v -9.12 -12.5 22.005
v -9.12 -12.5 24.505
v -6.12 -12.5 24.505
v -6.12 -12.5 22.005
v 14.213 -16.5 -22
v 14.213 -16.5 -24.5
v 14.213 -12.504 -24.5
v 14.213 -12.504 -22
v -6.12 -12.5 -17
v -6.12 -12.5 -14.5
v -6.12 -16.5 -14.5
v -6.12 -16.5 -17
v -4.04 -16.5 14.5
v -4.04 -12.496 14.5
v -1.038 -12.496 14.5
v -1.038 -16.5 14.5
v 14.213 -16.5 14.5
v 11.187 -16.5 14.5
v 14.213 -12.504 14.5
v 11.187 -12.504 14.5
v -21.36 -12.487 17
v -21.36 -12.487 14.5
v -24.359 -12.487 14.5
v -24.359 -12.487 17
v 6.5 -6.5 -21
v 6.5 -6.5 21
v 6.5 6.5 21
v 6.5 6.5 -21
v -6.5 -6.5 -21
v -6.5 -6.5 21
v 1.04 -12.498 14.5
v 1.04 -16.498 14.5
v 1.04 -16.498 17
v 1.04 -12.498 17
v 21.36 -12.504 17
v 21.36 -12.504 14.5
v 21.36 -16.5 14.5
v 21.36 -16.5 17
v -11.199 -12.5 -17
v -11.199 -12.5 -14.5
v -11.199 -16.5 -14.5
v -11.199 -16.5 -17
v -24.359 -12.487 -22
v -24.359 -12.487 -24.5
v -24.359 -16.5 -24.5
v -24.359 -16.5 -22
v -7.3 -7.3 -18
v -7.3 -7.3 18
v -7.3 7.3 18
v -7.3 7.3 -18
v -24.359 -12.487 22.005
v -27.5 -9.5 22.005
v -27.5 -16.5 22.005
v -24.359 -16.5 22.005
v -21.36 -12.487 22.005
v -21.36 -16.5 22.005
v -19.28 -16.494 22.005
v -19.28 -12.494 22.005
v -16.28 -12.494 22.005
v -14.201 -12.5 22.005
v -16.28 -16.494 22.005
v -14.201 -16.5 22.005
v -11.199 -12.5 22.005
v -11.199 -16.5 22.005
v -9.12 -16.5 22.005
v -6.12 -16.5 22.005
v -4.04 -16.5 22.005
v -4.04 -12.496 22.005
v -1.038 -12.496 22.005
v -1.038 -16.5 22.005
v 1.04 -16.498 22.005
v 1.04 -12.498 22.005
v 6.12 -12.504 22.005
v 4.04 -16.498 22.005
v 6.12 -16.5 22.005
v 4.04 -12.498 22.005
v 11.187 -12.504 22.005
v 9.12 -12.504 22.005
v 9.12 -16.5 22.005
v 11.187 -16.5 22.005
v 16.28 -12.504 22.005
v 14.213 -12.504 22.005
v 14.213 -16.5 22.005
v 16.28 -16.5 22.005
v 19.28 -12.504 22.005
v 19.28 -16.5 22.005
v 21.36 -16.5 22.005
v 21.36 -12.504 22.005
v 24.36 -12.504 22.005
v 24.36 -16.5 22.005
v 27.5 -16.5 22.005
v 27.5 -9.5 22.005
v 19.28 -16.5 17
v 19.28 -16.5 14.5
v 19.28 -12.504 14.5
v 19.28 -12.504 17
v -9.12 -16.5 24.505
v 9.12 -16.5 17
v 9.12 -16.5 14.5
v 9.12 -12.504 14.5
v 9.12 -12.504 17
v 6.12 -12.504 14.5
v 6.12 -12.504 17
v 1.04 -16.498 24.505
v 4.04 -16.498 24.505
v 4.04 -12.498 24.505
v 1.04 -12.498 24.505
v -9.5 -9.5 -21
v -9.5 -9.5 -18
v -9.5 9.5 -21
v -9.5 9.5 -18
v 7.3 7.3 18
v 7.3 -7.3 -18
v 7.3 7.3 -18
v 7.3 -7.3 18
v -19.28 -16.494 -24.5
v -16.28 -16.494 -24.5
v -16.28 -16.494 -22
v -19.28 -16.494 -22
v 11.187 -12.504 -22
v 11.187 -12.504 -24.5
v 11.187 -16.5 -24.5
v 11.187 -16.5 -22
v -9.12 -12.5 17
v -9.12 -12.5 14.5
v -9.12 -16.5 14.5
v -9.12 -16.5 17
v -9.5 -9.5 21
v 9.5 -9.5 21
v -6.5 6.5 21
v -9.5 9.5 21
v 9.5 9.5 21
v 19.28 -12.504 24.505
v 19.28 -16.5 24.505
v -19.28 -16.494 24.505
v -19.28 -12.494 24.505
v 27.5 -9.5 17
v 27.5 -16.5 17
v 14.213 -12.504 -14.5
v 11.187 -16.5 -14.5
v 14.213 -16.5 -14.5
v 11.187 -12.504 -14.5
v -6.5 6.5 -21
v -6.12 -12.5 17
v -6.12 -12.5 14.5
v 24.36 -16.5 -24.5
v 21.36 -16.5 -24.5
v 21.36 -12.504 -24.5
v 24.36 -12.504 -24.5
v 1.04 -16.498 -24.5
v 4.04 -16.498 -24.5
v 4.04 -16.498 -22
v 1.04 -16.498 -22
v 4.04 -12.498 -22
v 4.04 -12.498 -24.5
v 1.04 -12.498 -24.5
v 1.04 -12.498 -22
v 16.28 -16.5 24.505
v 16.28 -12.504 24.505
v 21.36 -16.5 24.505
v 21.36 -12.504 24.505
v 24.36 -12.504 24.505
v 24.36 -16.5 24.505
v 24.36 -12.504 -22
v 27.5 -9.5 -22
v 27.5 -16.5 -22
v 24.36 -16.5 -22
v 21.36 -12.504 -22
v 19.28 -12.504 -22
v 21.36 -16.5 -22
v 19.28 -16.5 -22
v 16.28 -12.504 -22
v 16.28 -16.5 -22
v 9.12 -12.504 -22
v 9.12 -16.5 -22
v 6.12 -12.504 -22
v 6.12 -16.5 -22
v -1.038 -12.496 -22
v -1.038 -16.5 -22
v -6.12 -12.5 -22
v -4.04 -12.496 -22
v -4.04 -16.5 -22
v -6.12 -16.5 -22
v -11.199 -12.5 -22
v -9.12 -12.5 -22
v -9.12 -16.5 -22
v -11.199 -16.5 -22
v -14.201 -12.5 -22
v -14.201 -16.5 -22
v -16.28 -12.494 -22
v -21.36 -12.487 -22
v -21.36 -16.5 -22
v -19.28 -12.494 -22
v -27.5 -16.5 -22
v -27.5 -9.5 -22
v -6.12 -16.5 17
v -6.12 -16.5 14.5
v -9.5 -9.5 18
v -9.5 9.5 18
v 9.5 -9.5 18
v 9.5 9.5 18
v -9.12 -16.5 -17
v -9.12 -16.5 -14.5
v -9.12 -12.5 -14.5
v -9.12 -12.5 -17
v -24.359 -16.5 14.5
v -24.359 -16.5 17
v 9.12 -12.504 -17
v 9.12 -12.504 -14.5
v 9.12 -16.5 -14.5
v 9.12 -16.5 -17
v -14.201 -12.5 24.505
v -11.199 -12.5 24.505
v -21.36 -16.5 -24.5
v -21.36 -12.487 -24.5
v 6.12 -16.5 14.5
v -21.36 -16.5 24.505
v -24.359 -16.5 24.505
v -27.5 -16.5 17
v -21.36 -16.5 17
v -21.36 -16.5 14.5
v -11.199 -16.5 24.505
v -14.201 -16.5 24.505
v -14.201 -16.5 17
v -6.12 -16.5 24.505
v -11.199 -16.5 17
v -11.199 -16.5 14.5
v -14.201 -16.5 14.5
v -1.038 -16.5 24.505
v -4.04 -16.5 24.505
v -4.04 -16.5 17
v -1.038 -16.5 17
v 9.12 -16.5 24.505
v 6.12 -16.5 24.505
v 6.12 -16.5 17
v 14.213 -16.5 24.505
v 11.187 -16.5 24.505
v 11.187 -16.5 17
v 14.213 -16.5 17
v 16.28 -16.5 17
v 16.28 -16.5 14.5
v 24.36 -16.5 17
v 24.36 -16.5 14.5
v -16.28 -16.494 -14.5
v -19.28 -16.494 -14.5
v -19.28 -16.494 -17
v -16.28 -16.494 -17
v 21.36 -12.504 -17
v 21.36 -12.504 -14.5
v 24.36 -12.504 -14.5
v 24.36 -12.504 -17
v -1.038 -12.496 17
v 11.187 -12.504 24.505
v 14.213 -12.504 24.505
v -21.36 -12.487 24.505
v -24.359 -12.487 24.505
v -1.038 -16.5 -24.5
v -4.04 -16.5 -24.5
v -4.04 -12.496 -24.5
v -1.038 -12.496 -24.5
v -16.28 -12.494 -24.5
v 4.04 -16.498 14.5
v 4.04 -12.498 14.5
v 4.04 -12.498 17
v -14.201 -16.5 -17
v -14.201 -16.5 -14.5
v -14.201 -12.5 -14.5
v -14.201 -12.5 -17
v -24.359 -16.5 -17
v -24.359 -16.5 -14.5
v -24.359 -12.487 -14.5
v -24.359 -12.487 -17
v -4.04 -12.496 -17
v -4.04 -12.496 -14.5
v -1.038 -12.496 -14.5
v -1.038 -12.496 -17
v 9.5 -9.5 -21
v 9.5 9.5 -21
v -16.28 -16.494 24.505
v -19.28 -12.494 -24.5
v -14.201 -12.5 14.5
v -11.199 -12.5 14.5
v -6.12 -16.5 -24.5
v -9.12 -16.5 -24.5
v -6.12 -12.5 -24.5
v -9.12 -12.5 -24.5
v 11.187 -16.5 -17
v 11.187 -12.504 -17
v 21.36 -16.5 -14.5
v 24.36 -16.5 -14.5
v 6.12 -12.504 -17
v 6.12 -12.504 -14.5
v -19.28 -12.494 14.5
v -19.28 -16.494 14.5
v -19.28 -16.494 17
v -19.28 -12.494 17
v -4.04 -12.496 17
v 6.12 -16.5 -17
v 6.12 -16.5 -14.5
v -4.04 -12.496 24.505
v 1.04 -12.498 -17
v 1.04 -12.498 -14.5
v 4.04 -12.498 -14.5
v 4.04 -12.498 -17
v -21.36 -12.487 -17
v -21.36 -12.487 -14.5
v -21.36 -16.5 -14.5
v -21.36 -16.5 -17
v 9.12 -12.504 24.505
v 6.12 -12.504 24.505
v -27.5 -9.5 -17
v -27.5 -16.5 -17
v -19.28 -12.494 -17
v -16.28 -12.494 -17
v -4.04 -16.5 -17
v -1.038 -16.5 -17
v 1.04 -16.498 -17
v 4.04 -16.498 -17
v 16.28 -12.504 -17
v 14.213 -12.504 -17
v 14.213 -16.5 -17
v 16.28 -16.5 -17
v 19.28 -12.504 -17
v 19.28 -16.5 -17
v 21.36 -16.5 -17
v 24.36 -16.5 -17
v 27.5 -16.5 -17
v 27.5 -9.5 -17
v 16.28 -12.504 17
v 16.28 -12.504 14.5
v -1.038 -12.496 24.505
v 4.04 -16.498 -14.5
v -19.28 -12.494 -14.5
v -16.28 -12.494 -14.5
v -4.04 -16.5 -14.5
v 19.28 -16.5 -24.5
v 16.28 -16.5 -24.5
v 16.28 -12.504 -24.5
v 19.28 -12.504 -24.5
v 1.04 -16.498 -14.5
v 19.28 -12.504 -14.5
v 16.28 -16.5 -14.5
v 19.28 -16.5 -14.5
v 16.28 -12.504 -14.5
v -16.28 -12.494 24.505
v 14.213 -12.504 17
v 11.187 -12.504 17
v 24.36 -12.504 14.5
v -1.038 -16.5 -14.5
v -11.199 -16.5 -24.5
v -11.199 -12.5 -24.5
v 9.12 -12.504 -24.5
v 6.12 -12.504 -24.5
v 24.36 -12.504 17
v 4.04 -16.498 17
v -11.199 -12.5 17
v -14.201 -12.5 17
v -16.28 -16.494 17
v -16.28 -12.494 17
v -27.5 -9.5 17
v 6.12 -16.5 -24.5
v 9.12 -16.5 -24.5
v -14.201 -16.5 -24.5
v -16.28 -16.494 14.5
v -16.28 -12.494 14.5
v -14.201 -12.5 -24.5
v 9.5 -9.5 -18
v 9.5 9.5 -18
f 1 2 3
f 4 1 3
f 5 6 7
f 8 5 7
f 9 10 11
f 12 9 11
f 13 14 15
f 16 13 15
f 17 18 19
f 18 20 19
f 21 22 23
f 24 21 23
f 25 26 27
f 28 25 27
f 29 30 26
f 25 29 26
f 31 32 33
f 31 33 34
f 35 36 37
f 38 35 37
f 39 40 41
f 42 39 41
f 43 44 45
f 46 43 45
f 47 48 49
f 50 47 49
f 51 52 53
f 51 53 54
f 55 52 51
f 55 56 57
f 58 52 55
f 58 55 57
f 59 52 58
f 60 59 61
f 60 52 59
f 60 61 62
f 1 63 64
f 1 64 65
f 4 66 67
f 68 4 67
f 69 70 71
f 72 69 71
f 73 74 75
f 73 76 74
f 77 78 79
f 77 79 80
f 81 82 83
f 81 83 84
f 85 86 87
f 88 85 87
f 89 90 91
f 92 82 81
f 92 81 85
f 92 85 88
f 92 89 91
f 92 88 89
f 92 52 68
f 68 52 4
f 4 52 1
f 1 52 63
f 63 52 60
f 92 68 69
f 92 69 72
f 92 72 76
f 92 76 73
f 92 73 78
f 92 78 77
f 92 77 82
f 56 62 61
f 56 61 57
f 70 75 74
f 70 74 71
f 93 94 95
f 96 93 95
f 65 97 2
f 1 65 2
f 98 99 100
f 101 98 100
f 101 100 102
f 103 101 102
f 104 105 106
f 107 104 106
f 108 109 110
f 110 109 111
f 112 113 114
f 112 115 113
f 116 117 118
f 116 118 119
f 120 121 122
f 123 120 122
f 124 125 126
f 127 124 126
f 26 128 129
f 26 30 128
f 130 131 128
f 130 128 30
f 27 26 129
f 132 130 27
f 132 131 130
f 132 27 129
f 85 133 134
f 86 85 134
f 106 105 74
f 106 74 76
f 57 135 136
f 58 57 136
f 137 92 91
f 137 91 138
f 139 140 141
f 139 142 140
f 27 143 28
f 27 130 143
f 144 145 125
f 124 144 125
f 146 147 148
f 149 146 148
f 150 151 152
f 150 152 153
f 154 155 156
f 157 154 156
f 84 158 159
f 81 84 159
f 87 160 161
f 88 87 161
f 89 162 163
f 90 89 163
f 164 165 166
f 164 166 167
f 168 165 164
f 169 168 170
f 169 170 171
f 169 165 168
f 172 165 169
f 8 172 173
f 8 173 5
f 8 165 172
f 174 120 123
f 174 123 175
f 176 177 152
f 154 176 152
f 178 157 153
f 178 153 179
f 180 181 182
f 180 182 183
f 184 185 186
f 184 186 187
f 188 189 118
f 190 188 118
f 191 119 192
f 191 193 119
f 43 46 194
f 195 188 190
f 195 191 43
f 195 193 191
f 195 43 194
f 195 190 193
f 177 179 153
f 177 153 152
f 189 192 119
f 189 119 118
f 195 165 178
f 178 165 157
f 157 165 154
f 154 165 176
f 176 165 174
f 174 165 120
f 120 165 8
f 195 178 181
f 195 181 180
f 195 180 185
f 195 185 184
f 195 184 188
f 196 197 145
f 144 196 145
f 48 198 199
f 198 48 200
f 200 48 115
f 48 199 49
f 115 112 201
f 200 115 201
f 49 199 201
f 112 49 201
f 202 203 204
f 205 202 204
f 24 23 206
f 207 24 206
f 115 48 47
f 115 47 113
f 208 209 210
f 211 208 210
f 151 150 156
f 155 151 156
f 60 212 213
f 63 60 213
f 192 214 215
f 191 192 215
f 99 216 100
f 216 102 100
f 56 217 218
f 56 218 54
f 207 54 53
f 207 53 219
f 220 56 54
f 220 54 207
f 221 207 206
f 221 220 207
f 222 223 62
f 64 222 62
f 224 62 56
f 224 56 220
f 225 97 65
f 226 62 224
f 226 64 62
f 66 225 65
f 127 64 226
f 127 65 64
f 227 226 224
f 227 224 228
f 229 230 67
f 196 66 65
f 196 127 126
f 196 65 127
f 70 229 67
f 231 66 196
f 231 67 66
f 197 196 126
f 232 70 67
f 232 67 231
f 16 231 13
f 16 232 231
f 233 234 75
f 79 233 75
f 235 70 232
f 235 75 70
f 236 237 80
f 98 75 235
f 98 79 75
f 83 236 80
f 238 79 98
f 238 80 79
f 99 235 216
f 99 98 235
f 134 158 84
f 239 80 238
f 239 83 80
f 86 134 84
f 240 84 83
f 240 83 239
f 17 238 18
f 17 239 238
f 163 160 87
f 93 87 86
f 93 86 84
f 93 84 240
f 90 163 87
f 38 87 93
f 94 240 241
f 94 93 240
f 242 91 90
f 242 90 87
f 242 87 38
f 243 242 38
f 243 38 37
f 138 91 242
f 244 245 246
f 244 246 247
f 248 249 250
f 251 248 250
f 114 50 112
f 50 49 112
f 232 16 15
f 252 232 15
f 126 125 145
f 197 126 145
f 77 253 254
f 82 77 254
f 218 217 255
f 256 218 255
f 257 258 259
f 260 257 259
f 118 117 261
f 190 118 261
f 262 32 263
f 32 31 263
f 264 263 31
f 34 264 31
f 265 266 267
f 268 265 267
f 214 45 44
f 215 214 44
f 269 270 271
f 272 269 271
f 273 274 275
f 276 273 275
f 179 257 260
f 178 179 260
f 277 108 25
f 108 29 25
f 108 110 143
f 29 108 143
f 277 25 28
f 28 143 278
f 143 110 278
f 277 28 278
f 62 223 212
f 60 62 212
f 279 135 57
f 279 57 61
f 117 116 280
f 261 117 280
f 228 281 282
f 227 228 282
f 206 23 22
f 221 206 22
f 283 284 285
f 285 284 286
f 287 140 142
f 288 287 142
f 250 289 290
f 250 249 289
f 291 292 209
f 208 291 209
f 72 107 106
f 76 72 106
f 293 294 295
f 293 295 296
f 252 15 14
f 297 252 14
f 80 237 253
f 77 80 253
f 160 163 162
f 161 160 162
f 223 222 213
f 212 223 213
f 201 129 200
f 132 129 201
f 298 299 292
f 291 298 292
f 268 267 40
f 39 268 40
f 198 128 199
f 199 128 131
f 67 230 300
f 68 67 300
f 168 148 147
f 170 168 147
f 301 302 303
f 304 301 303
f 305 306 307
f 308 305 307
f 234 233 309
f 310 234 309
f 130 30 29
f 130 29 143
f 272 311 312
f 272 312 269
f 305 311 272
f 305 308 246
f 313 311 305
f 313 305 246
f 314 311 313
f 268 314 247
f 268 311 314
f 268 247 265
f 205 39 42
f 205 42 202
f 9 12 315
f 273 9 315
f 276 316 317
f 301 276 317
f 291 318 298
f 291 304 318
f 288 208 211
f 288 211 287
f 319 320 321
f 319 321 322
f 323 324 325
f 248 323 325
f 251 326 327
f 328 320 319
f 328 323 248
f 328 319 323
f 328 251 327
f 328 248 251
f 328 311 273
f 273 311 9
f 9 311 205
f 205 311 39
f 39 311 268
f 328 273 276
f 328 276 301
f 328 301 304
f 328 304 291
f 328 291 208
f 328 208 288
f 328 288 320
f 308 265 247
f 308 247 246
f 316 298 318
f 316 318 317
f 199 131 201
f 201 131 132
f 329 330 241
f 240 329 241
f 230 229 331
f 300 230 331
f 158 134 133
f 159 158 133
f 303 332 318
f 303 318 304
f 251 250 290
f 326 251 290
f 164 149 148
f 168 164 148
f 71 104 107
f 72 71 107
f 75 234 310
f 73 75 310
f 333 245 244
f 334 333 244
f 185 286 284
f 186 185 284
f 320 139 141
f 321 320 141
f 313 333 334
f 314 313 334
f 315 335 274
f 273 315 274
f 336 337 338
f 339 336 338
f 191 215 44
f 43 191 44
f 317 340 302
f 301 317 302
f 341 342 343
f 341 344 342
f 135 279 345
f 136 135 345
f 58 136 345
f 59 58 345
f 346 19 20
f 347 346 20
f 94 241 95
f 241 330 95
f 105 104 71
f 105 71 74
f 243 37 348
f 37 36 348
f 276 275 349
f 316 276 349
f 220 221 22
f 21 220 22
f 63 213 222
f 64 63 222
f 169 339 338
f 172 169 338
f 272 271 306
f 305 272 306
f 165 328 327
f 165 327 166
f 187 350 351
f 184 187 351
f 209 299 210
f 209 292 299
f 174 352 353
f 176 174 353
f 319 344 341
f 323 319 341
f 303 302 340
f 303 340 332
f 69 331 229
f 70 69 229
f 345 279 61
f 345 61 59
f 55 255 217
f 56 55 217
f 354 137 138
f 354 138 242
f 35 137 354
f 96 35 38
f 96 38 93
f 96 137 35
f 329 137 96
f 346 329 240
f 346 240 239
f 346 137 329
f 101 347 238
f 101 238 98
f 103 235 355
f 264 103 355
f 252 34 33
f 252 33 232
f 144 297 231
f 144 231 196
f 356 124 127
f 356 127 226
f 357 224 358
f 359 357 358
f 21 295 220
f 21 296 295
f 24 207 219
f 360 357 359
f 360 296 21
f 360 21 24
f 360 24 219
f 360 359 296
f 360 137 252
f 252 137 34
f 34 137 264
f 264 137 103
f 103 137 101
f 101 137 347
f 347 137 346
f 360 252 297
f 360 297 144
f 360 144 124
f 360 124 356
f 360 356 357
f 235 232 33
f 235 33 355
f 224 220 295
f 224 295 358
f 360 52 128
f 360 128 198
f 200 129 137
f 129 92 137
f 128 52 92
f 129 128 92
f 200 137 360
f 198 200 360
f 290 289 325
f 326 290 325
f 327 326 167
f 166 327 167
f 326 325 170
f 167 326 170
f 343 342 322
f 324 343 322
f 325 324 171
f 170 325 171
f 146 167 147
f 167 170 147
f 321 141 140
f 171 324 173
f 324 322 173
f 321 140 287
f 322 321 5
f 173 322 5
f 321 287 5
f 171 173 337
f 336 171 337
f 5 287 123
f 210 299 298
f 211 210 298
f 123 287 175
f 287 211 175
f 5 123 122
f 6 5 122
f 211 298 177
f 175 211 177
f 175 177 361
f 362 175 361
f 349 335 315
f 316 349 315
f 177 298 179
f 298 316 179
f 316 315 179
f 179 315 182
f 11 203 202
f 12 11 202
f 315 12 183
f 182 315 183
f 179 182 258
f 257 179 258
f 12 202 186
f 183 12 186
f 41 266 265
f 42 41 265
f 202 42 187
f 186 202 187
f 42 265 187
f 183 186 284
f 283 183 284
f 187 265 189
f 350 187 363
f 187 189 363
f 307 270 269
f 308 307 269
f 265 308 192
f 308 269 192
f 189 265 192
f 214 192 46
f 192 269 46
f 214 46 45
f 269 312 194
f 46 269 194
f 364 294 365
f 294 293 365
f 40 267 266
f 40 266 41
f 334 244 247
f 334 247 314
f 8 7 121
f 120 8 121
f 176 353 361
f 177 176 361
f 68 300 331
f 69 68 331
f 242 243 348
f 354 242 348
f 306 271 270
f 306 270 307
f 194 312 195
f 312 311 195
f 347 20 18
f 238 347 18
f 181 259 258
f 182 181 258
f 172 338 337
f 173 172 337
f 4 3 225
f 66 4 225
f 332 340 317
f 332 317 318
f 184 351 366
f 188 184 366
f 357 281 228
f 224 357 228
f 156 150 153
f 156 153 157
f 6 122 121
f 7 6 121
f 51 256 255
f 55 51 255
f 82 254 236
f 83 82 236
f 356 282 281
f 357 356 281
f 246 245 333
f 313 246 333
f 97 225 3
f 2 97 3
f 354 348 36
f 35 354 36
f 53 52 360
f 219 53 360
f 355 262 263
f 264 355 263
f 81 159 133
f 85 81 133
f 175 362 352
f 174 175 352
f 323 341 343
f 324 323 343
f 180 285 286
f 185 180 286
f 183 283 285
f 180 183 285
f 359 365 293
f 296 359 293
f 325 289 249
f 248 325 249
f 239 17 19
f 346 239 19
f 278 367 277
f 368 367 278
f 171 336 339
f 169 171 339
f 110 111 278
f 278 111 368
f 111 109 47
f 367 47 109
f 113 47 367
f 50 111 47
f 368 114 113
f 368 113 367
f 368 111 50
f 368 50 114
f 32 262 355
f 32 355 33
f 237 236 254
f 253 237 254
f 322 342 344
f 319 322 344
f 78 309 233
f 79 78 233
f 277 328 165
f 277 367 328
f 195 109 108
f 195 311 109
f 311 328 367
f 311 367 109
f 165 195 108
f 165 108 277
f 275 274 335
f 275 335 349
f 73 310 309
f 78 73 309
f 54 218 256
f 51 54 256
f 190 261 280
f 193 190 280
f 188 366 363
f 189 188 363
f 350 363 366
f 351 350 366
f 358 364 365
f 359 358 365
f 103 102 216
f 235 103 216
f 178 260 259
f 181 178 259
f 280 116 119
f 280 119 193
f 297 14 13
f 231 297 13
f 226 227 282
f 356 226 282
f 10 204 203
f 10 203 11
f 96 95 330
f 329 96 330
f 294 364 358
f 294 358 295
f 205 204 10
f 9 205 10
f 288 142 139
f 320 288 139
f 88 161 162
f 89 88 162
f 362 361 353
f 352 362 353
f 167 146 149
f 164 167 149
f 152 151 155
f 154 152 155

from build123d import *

# Parameters (mm, degrees)
EXTRUDE_1_DEPTH      = 21
SKETCH_1_3_W         = 13
SKETCH_1_3_H         = 13
CUT_EXTRUDE_1_DEPTH  = 21
SKETCH_1_12_W        = 19
SKETCH_1_12_H        = 19
SKETCH_1_12_W_2      = 14.6
SKETCH_1_12_H_2      = 14.6
SKETCH_1_12_W_3      = 13
SKETCH_1_12_H_3      = 13
CUT_EXTRUDE_6_DEPTH  = 18
CUT_EXTRUDE_7_DEPTH  = 14.5
SKETCH_4_W           = 3.504900739
SKETCH_4_H           = 7
SKETCH_4_W_2         = 3.5
EXTRUDE_2_DEPTH      = 27.5
SKETCH_5_W           = 3
SKETCH_5_H           = 4
CUT_EXTRUDE_8_DEPTH  = 2.5
SKETCH_7_W           = 3
SKETCH_7_H           = 4
CUT_EXTRUDE_9_DEPTH  = 2.5
SKETCH_9_W           = 3
SKETCH_9_H           = 4
CUT_EXTRUDE_10_DEPTH = 2.5
SKETCH_10_W          = 3
SKETCH_10_H          = 4
CUT_EXTRUDE_11_DEPTH = 2.5


with BuildPart() as part:
    # 草图1 → 凸台-拉伸1 (new, symmetric)
    with BuildSketch(Plane.XY):
        Polygon((9.5, 9.5), (-9.5, 9.5), (-9.5, -9.5), (-27.5, -9.5), (-27.5, -16.5), (27.5, -16.5), (27.5, -9.5), (9.5, -9.5), align=None)
    extrude(amount=EXTRUDE_1_DEPTH, both=True)

    # 草图1<3> → 切除-拉伸1 (cut, symmetric)
    with BuildSketch(Plane.XY):
        Rectangle(SKETCH_1_3_W, SKETCH_1_3_H)
    extrude(amount=CUT_EXTRUDE_1_DEPTH, both=True, mode=Mode.SUBTRACT)

    # 草图1<12> → 切除-拉伸6 (cut, symmetric)
    # profile 1 of 2: a face of its own
    with BuildSketch(Plane.XY):
        Rectangle(SKETCH_1_12_W, SKETCH_1_12_H)
        Rectangle(SKETCH_1_12_W_2, SKETCH_1_12_H_2, mode=Mode.SUBTRACT)
    # profile 2 of 2: a face of its own
    with BuildSketch(Plane.XY):
        Rectangle(SKETCH_1_12_W_3, SKETCH_1_12_H_3)
    extrude(amount=CUT_EXTRUDE_6_DEPTH, both=True, mode=Mode.SUBTRACT)

    # 草图1<13> → 切除-拉伸7 (cut, symmetric)
    with BuildSketch(Plane.XY):
        Polygon((9.5, -9.5), (-9.5, -9.5), (-27.5, -9.5), (-27.5, -16.5), (27.5, -16.5), (27.5, -9.5), align=None)
    extrude(amount=CUT_EXTRUDE_7_DEPTH, both=True, mode=Mode.SUBTRACT)

    # 草图4 → 凸台-拉伸2 (add, symmetric)
    with BuildSketch(Plane(origin=(0, 0, 0), x_dir=(0, 0, -1), z_dir=(1, 0, 0))):
        with Locations((-22.752450369, -13)):
            Rectangle(SKETCH_4_W, SKETCH_4_H)
        with Locations((22.75, -13)):
            Rectangle(SKETCH_4_W_2, SKETCH_4_H)
    extrude(amount=EXTRUDE_2_DEPTH, both=True)

    # 草图5 → 切除-拉伸8 (cut)
    with BuildSketch(Plane(origin=(0, 0, -24.5), x_dir=(-1, 0, 0), z_dir=(0, 0, -1))):
        Polygon((-19.28, -12.503647236), (-16.28, -12.503647236), (-16.28, -16.5), (-14.213019691, -16.5), (-14.213019691, -12.503647236), (-11.186980309, -12.503647236), (-11.186980309, -16.5), (-9.12, -16.5), (-9.12, -12.503647236), (-6.12, -12.503647236), (-6.12, -16.5), (1.038031299, -16.5), (1.038031299, -12.495586292), (4.04, -12.495586292), (4.04, -16.5), (6.12, -16.5), (6.12, -12.5), (9.12, -12.5), (9.12, -16.5), (11.198647667, -16.5), (11.198647667, -12.5), (14.201352333, -12.5), (14.201352333, -16.5), (21.36, -16.5), (21.36, -12.487022539), (24.35864906, -12.487022539), (24.35864906, -16.5), (27.5, -16.5), (27.5, -9.5), (-27.5, -9.5), (-27.5, -16.5), (-24.36, -16.5), (-24.36, -12.503647236), (-21.36, -12.503647236), (-21.36, -16.5), (-19.28, -16.5), align=None)
        with Locations((17.78, -14.493511269)):
            Rectangle(SKETCH_5_W, SKETCH_5_H, mode=Mode.SUBTRACT)
        with Locations((-2.54, -14.497793146)):
            Rectangle(SKETCH_5_W, SKETCH_5_H, mode=Mode.SUBTRACT)
    extrude(amount=-CUT_EXTRUDE_8_DEPTH, mode=Mode.SUBTRACT)

    # 草图7 → 切除-拉伸9 (cut)
    with BuildSketch(Plane.XY.offset(-14.5)):
        Polygon((24.36, -16.5), (27.5, -16.5), (27.5, -9.5), (-27.5, -9.5), (-27.5, -16.5), (-24.35864906, -16.5), (-24.35864906, -12.487022539), (-21.36, -12.487022539), (-21.36, -16.5), (-14.201352333, -16.5), (-14.201352333, -12.5), (-11.198647667, -12.5), (-11.198647667, -16.5), (-9.12, -16.5), (-9.12, -12.5), (-6.12, -12.5), (-6.12, -16.5), (-4.04, -16.5), (-4.04, -12.495586292), (-1.038031299, -12.495586292), (-1.038031299, -16.5), (6.12, -16.5), (6.12, -12.503647236), (9.12, -12.503647236), (9.12, -16.5), (11.186980309, -16.5), (11.186980309, -12.503647236), (14.213019691, -12.503647236), (14.213019691, -16.5), (16.28, -16.5), (16.28, -12.503647236), (19.28, -12.503647236), (19.28, -16.5), (21.36, -16.5), (21.36, -12.503647236), (24.36, -12.503647236), align=None)
        with Locations((-17.78, -14.493511269)):
            Rectangle(SKETCH_7_W, SKETCH_7_H, mode=Mode.SUBTRACT)
        with Locations((2.54, -14.497793146)):
            Rectangle(SKETCH_7_W, SKETCH_7_H, mode=Mode.SUBTRACT)
    extrude(amount=-CUT_EXTRUDE_9_DEPTH, mode=Mode.SUBTRACT)

    # 草图9 → 切除-拉伸10 (cut)
    with BuildSketch(Plane(origin=(0, 0, 14.5), x_dir=(-1, 0, 0), z_dir=(0, 0, -1))):
        Polygon((27.5, -9.5), (-27.5, -9.5), (-27.5, -16.5), (-24.36, -16.5), (-24.36, -12.503647236), (-21.36, -12.503647236), (-21.36, -16.5), (-19.28, -16.5), (-19.28, -12.503647236), (-16.28, -12.503647236), (-16.28, -16.5), (-14.213019691, -16.5), (-14.213019691, -12.503647236), (-11.186980309, -12.503647236), (-11.186980309, -16.5), (-9.12, -16.5), (-9.12, -12.503647236), (-6.12, -12.503647236), (-6.12, -16.5), (1.038031299, -16.5), (1.038031299, -12.495586292), (4.04, -12.495586292), (4.04, -16.5), (6.12, -16.5), (6.12, -12.5), (9.12, -12.5), (9.12, -16.5), (11.198647667, -16.5), (11.198647667, -12.5), (14.201352333, -12.5), (14.201352333, -16.5), (21.36, -16.5), (21.36, -12.487022539), (24.35864906, -12.487022539), (24.35864906, -16.5), (27.5, -16.5), align=None)
        with Locations((-2.54, -14.497793146)):
            Rectangle(SKETCH_9_W, SKETCH_9_H, mode=Mode.SUBTRACT)
        with Locations((17.78, -14.493511269)):
            Rectangle(SKETCH_9_W, SKETCH_9_H, mode=Mode.SUBTRACT)
    extrude(amount=-CUT_EXTRUDE_10_DEPTH, mode=Mode.SUBTRACT)

    # 草图10 → 切除-拉伸11 (cut)
    with BuildSketch(Plane.XY.offset(24.504900739)):
        Polygon((27.5, -9.5), (-27.5, -9.5), (-27.5, -16.5), (-24.35864906, -16.5), (-24.35864906, -12.487022539), (-21.36, -12.487022539), (-21.36, -16.5), (-14.201352333, -16.5), (-14.201352333, -12.5), (-11.198647667, -12.5), (-11.198647667, -16.5), (-9.12, -16.5), (-9.12, -12.5), (-6.12, -12.5), (-6.12, -16.5), (-4.04, -16.5), (-4.04, -12.495586292), (-1.038031299, -12.495586292), (-1.038031299, -16.5), (6.12, -16.5), (6.12, -12.503647236), (9.12, -12.503647236), (9.12, -16.5), (11.186980309, -16.5), (11.186980309, -12.503647236), (14.213019691, -12.503647236), (14.213019691, -16.5), (16.28, -16.5), (16.28, -12.503647236), (19.28, -12.503647236), (19.28, -16.5), (21.36, -16.5), (21.36, -12.503647236), (24.36, -12.503647236), (24.36, -16.5), (27.5, -16.5), align=None)
        with Locations((-17.78, -14.493511269)):
            Rectangle(SKETCH_10_W, SKETCH_10_H, mode=Mode.SUBTRACT)
        with Locations((2.54, -14.497793146)):
            Rectangle(SKETCH_10_W, SKETCH_10_H, mode=Mode.SUBTRACT)
    extrude(amount=-CUT_EXTRUDE_11_DEPTH, mode=Mode.SUBTRACT)


solid = part.part
